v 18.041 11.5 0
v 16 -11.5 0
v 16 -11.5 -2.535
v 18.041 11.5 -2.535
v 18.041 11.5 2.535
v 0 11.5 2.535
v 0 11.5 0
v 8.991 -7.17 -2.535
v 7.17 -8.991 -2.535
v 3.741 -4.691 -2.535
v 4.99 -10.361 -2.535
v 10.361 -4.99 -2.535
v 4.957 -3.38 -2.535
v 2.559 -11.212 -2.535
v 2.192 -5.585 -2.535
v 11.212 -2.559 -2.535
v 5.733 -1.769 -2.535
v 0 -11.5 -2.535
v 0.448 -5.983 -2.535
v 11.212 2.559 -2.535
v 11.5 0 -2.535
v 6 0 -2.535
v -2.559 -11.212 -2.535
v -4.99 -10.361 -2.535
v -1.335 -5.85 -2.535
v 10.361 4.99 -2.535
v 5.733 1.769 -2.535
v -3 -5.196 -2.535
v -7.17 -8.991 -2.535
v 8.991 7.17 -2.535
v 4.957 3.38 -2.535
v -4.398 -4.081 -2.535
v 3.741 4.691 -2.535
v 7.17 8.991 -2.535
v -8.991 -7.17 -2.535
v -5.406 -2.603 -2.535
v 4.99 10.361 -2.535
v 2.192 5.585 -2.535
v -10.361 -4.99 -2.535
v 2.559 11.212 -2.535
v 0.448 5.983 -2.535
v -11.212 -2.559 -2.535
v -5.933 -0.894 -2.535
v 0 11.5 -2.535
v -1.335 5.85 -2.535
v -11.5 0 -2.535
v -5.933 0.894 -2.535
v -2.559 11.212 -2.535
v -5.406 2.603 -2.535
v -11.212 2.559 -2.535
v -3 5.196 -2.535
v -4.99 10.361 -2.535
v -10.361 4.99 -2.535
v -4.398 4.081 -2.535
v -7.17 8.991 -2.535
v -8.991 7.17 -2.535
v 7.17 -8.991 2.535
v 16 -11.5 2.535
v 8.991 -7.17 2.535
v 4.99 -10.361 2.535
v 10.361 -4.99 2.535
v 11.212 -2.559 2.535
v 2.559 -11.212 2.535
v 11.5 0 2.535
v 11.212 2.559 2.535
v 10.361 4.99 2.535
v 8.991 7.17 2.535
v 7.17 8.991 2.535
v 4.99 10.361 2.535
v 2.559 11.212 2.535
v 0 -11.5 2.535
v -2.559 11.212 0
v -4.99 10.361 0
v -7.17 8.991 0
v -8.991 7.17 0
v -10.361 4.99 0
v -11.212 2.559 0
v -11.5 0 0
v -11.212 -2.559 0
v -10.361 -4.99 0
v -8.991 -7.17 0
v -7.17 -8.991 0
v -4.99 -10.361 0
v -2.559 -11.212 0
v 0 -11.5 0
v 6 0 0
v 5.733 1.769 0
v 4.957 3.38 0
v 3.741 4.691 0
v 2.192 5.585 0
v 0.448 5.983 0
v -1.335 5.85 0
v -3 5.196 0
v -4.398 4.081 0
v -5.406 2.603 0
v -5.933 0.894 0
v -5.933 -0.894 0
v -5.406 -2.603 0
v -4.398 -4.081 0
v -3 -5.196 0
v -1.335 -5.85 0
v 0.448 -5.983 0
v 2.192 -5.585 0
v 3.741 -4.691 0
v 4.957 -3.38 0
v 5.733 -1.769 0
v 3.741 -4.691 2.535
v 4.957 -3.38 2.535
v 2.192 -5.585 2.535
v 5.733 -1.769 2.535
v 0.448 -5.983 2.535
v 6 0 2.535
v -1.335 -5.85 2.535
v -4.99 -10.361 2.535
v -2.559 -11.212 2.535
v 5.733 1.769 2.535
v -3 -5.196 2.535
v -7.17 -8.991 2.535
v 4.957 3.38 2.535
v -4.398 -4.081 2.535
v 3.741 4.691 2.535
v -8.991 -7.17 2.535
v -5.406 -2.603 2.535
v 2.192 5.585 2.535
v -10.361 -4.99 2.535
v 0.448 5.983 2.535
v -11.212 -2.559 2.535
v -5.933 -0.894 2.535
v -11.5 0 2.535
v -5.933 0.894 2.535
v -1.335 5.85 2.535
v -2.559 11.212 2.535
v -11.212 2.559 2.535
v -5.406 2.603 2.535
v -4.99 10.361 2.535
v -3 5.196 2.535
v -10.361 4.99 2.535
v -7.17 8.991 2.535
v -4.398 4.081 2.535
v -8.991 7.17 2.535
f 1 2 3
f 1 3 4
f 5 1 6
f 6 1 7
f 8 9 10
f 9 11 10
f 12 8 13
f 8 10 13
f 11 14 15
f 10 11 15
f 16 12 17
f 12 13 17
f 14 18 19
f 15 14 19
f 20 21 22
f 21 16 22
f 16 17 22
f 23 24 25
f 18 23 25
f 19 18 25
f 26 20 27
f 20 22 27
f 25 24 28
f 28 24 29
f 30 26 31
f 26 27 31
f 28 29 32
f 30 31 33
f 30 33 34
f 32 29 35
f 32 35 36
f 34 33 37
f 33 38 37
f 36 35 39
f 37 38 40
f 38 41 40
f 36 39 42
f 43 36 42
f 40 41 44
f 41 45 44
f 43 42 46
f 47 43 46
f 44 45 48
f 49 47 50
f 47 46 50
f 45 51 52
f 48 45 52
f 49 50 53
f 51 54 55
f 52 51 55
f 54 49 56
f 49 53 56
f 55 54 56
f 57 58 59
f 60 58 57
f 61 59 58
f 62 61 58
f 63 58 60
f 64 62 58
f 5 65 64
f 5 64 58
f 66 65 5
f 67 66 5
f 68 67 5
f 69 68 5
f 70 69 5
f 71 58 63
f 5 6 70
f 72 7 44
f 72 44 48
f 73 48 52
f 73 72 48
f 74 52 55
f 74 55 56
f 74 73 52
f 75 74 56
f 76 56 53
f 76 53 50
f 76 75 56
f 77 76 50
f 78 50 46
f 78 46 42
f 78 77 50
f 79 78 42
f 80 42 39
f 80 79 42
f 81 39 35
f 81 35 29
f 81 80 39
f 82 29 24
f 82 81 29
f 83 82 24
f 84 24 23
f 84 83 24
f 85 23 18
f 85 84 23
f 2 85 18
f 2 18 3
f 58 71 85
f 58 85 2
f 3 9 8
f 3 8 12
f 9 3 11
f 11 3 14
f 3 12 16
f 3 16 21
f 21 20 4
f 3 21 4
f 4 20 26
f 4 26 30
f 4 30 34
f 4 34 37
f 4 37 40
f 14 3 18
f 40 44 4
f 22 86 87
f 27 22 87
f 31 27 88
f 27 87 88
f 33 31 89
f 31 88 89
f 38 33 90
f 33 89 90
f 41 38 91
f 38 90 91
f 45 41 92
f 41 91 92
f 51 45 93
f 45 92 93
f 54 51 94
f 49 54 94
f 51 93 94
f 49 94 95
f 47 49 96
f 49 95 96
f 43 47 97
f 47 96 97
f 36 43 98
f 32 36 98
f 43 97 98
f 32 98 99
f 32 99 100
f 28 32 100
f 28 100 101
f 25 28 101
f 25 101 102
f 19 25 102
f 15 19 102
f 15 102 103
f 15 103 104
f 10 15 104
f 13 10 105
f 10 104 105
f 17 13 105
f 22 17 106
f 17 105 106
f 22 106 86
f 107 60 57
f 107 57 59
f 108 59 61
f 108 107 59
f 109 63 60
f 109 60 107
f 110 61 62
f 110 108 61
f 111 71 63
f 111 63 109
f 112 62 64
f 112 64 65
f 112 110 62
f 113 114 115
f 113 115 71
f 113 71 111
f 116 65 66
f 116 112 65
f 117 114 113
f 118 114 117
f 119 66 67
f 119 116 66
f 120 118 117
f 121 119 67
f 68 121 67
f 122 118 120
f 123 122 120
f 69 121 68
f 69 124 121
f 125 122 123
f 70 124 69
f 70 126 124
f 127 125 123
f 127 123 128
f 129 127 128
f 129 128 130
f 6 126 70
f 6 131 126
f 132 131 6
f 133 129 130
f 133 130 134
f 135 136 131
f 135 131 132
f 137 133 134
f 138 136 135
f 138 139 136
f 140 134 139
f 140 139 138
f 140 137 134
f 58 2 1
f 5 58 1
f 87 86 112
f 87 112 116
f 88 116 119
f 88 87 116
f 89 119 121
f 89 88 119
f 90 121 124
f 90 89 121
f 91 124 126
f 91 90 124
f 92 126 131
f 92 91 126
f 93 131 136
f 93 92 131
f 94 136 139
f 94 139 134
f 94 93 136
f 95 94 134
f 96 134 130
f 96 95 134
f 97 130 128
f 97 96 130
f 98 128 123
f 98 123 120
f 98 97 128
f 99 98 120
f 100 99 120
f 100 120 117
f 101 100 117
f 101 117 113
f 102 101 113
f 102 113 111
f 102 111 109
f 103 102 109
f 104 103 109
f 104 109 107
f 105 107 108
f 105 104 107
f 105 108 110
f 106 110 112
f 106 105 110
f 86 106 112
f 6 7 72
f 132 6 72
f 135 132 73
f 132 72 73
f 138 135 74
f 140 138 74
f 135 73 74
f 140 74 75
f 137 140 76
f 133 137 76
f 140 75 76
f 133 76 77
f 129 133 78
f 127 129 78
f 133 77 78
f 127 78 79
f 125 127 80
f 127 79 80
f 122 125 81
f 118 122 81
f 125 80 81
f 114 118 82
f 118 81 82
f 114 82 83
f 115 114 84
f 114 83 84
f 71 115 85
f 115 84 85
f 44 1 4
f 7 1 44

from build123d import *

# Parameters (mm, degrees)
SKETCH1_R           = 6
BOSS_EXTRUDE1_DEPTH = 2.535


with BuildPart() as part:
    # Sketch1 → Boss-Extrude1 (new, symmetric)
    # profile 1 of 2: a face of its own
    with BuildSketch(Plane(origin=(0, 0, 0), x_dir=(0, 1, 0), z_dir=(0, 0, 1))):
        with BuildLine():
            ThreePointArc((11.5, 0), (0, 11.5), (-11.5, 0))
            ThreePointArc((-11.5, 0), (0, -11.5), (11.5, 0))
        make_face()
        with Locations(Location((0, 0, 0), (0, 0, 270))):
            Circle(SKETCH1_R, mode=Mode.SUBTRACT)
    # profile 2 of 2: a face of its own
    with BuildSketch(Plane(origin=(0, 0, 0), x_dir=(0, 1, 0), z_dir=(0, 0, 1))):
        with BuildLine():
            ThreePointArc((11.5, 0), (0, -11.5), (-11.5, 0))
            Line((-11.5, 0), (-11.5, -16))
            Line((-11.5, -16), (11.5, -18.040557186))
            Line((11.5, -18.040557186), (11.5, 0))
        make_face()
    extrude(amount=BOSS_EXTRUDE1_DEPTH, both=True)


solid = part.part
